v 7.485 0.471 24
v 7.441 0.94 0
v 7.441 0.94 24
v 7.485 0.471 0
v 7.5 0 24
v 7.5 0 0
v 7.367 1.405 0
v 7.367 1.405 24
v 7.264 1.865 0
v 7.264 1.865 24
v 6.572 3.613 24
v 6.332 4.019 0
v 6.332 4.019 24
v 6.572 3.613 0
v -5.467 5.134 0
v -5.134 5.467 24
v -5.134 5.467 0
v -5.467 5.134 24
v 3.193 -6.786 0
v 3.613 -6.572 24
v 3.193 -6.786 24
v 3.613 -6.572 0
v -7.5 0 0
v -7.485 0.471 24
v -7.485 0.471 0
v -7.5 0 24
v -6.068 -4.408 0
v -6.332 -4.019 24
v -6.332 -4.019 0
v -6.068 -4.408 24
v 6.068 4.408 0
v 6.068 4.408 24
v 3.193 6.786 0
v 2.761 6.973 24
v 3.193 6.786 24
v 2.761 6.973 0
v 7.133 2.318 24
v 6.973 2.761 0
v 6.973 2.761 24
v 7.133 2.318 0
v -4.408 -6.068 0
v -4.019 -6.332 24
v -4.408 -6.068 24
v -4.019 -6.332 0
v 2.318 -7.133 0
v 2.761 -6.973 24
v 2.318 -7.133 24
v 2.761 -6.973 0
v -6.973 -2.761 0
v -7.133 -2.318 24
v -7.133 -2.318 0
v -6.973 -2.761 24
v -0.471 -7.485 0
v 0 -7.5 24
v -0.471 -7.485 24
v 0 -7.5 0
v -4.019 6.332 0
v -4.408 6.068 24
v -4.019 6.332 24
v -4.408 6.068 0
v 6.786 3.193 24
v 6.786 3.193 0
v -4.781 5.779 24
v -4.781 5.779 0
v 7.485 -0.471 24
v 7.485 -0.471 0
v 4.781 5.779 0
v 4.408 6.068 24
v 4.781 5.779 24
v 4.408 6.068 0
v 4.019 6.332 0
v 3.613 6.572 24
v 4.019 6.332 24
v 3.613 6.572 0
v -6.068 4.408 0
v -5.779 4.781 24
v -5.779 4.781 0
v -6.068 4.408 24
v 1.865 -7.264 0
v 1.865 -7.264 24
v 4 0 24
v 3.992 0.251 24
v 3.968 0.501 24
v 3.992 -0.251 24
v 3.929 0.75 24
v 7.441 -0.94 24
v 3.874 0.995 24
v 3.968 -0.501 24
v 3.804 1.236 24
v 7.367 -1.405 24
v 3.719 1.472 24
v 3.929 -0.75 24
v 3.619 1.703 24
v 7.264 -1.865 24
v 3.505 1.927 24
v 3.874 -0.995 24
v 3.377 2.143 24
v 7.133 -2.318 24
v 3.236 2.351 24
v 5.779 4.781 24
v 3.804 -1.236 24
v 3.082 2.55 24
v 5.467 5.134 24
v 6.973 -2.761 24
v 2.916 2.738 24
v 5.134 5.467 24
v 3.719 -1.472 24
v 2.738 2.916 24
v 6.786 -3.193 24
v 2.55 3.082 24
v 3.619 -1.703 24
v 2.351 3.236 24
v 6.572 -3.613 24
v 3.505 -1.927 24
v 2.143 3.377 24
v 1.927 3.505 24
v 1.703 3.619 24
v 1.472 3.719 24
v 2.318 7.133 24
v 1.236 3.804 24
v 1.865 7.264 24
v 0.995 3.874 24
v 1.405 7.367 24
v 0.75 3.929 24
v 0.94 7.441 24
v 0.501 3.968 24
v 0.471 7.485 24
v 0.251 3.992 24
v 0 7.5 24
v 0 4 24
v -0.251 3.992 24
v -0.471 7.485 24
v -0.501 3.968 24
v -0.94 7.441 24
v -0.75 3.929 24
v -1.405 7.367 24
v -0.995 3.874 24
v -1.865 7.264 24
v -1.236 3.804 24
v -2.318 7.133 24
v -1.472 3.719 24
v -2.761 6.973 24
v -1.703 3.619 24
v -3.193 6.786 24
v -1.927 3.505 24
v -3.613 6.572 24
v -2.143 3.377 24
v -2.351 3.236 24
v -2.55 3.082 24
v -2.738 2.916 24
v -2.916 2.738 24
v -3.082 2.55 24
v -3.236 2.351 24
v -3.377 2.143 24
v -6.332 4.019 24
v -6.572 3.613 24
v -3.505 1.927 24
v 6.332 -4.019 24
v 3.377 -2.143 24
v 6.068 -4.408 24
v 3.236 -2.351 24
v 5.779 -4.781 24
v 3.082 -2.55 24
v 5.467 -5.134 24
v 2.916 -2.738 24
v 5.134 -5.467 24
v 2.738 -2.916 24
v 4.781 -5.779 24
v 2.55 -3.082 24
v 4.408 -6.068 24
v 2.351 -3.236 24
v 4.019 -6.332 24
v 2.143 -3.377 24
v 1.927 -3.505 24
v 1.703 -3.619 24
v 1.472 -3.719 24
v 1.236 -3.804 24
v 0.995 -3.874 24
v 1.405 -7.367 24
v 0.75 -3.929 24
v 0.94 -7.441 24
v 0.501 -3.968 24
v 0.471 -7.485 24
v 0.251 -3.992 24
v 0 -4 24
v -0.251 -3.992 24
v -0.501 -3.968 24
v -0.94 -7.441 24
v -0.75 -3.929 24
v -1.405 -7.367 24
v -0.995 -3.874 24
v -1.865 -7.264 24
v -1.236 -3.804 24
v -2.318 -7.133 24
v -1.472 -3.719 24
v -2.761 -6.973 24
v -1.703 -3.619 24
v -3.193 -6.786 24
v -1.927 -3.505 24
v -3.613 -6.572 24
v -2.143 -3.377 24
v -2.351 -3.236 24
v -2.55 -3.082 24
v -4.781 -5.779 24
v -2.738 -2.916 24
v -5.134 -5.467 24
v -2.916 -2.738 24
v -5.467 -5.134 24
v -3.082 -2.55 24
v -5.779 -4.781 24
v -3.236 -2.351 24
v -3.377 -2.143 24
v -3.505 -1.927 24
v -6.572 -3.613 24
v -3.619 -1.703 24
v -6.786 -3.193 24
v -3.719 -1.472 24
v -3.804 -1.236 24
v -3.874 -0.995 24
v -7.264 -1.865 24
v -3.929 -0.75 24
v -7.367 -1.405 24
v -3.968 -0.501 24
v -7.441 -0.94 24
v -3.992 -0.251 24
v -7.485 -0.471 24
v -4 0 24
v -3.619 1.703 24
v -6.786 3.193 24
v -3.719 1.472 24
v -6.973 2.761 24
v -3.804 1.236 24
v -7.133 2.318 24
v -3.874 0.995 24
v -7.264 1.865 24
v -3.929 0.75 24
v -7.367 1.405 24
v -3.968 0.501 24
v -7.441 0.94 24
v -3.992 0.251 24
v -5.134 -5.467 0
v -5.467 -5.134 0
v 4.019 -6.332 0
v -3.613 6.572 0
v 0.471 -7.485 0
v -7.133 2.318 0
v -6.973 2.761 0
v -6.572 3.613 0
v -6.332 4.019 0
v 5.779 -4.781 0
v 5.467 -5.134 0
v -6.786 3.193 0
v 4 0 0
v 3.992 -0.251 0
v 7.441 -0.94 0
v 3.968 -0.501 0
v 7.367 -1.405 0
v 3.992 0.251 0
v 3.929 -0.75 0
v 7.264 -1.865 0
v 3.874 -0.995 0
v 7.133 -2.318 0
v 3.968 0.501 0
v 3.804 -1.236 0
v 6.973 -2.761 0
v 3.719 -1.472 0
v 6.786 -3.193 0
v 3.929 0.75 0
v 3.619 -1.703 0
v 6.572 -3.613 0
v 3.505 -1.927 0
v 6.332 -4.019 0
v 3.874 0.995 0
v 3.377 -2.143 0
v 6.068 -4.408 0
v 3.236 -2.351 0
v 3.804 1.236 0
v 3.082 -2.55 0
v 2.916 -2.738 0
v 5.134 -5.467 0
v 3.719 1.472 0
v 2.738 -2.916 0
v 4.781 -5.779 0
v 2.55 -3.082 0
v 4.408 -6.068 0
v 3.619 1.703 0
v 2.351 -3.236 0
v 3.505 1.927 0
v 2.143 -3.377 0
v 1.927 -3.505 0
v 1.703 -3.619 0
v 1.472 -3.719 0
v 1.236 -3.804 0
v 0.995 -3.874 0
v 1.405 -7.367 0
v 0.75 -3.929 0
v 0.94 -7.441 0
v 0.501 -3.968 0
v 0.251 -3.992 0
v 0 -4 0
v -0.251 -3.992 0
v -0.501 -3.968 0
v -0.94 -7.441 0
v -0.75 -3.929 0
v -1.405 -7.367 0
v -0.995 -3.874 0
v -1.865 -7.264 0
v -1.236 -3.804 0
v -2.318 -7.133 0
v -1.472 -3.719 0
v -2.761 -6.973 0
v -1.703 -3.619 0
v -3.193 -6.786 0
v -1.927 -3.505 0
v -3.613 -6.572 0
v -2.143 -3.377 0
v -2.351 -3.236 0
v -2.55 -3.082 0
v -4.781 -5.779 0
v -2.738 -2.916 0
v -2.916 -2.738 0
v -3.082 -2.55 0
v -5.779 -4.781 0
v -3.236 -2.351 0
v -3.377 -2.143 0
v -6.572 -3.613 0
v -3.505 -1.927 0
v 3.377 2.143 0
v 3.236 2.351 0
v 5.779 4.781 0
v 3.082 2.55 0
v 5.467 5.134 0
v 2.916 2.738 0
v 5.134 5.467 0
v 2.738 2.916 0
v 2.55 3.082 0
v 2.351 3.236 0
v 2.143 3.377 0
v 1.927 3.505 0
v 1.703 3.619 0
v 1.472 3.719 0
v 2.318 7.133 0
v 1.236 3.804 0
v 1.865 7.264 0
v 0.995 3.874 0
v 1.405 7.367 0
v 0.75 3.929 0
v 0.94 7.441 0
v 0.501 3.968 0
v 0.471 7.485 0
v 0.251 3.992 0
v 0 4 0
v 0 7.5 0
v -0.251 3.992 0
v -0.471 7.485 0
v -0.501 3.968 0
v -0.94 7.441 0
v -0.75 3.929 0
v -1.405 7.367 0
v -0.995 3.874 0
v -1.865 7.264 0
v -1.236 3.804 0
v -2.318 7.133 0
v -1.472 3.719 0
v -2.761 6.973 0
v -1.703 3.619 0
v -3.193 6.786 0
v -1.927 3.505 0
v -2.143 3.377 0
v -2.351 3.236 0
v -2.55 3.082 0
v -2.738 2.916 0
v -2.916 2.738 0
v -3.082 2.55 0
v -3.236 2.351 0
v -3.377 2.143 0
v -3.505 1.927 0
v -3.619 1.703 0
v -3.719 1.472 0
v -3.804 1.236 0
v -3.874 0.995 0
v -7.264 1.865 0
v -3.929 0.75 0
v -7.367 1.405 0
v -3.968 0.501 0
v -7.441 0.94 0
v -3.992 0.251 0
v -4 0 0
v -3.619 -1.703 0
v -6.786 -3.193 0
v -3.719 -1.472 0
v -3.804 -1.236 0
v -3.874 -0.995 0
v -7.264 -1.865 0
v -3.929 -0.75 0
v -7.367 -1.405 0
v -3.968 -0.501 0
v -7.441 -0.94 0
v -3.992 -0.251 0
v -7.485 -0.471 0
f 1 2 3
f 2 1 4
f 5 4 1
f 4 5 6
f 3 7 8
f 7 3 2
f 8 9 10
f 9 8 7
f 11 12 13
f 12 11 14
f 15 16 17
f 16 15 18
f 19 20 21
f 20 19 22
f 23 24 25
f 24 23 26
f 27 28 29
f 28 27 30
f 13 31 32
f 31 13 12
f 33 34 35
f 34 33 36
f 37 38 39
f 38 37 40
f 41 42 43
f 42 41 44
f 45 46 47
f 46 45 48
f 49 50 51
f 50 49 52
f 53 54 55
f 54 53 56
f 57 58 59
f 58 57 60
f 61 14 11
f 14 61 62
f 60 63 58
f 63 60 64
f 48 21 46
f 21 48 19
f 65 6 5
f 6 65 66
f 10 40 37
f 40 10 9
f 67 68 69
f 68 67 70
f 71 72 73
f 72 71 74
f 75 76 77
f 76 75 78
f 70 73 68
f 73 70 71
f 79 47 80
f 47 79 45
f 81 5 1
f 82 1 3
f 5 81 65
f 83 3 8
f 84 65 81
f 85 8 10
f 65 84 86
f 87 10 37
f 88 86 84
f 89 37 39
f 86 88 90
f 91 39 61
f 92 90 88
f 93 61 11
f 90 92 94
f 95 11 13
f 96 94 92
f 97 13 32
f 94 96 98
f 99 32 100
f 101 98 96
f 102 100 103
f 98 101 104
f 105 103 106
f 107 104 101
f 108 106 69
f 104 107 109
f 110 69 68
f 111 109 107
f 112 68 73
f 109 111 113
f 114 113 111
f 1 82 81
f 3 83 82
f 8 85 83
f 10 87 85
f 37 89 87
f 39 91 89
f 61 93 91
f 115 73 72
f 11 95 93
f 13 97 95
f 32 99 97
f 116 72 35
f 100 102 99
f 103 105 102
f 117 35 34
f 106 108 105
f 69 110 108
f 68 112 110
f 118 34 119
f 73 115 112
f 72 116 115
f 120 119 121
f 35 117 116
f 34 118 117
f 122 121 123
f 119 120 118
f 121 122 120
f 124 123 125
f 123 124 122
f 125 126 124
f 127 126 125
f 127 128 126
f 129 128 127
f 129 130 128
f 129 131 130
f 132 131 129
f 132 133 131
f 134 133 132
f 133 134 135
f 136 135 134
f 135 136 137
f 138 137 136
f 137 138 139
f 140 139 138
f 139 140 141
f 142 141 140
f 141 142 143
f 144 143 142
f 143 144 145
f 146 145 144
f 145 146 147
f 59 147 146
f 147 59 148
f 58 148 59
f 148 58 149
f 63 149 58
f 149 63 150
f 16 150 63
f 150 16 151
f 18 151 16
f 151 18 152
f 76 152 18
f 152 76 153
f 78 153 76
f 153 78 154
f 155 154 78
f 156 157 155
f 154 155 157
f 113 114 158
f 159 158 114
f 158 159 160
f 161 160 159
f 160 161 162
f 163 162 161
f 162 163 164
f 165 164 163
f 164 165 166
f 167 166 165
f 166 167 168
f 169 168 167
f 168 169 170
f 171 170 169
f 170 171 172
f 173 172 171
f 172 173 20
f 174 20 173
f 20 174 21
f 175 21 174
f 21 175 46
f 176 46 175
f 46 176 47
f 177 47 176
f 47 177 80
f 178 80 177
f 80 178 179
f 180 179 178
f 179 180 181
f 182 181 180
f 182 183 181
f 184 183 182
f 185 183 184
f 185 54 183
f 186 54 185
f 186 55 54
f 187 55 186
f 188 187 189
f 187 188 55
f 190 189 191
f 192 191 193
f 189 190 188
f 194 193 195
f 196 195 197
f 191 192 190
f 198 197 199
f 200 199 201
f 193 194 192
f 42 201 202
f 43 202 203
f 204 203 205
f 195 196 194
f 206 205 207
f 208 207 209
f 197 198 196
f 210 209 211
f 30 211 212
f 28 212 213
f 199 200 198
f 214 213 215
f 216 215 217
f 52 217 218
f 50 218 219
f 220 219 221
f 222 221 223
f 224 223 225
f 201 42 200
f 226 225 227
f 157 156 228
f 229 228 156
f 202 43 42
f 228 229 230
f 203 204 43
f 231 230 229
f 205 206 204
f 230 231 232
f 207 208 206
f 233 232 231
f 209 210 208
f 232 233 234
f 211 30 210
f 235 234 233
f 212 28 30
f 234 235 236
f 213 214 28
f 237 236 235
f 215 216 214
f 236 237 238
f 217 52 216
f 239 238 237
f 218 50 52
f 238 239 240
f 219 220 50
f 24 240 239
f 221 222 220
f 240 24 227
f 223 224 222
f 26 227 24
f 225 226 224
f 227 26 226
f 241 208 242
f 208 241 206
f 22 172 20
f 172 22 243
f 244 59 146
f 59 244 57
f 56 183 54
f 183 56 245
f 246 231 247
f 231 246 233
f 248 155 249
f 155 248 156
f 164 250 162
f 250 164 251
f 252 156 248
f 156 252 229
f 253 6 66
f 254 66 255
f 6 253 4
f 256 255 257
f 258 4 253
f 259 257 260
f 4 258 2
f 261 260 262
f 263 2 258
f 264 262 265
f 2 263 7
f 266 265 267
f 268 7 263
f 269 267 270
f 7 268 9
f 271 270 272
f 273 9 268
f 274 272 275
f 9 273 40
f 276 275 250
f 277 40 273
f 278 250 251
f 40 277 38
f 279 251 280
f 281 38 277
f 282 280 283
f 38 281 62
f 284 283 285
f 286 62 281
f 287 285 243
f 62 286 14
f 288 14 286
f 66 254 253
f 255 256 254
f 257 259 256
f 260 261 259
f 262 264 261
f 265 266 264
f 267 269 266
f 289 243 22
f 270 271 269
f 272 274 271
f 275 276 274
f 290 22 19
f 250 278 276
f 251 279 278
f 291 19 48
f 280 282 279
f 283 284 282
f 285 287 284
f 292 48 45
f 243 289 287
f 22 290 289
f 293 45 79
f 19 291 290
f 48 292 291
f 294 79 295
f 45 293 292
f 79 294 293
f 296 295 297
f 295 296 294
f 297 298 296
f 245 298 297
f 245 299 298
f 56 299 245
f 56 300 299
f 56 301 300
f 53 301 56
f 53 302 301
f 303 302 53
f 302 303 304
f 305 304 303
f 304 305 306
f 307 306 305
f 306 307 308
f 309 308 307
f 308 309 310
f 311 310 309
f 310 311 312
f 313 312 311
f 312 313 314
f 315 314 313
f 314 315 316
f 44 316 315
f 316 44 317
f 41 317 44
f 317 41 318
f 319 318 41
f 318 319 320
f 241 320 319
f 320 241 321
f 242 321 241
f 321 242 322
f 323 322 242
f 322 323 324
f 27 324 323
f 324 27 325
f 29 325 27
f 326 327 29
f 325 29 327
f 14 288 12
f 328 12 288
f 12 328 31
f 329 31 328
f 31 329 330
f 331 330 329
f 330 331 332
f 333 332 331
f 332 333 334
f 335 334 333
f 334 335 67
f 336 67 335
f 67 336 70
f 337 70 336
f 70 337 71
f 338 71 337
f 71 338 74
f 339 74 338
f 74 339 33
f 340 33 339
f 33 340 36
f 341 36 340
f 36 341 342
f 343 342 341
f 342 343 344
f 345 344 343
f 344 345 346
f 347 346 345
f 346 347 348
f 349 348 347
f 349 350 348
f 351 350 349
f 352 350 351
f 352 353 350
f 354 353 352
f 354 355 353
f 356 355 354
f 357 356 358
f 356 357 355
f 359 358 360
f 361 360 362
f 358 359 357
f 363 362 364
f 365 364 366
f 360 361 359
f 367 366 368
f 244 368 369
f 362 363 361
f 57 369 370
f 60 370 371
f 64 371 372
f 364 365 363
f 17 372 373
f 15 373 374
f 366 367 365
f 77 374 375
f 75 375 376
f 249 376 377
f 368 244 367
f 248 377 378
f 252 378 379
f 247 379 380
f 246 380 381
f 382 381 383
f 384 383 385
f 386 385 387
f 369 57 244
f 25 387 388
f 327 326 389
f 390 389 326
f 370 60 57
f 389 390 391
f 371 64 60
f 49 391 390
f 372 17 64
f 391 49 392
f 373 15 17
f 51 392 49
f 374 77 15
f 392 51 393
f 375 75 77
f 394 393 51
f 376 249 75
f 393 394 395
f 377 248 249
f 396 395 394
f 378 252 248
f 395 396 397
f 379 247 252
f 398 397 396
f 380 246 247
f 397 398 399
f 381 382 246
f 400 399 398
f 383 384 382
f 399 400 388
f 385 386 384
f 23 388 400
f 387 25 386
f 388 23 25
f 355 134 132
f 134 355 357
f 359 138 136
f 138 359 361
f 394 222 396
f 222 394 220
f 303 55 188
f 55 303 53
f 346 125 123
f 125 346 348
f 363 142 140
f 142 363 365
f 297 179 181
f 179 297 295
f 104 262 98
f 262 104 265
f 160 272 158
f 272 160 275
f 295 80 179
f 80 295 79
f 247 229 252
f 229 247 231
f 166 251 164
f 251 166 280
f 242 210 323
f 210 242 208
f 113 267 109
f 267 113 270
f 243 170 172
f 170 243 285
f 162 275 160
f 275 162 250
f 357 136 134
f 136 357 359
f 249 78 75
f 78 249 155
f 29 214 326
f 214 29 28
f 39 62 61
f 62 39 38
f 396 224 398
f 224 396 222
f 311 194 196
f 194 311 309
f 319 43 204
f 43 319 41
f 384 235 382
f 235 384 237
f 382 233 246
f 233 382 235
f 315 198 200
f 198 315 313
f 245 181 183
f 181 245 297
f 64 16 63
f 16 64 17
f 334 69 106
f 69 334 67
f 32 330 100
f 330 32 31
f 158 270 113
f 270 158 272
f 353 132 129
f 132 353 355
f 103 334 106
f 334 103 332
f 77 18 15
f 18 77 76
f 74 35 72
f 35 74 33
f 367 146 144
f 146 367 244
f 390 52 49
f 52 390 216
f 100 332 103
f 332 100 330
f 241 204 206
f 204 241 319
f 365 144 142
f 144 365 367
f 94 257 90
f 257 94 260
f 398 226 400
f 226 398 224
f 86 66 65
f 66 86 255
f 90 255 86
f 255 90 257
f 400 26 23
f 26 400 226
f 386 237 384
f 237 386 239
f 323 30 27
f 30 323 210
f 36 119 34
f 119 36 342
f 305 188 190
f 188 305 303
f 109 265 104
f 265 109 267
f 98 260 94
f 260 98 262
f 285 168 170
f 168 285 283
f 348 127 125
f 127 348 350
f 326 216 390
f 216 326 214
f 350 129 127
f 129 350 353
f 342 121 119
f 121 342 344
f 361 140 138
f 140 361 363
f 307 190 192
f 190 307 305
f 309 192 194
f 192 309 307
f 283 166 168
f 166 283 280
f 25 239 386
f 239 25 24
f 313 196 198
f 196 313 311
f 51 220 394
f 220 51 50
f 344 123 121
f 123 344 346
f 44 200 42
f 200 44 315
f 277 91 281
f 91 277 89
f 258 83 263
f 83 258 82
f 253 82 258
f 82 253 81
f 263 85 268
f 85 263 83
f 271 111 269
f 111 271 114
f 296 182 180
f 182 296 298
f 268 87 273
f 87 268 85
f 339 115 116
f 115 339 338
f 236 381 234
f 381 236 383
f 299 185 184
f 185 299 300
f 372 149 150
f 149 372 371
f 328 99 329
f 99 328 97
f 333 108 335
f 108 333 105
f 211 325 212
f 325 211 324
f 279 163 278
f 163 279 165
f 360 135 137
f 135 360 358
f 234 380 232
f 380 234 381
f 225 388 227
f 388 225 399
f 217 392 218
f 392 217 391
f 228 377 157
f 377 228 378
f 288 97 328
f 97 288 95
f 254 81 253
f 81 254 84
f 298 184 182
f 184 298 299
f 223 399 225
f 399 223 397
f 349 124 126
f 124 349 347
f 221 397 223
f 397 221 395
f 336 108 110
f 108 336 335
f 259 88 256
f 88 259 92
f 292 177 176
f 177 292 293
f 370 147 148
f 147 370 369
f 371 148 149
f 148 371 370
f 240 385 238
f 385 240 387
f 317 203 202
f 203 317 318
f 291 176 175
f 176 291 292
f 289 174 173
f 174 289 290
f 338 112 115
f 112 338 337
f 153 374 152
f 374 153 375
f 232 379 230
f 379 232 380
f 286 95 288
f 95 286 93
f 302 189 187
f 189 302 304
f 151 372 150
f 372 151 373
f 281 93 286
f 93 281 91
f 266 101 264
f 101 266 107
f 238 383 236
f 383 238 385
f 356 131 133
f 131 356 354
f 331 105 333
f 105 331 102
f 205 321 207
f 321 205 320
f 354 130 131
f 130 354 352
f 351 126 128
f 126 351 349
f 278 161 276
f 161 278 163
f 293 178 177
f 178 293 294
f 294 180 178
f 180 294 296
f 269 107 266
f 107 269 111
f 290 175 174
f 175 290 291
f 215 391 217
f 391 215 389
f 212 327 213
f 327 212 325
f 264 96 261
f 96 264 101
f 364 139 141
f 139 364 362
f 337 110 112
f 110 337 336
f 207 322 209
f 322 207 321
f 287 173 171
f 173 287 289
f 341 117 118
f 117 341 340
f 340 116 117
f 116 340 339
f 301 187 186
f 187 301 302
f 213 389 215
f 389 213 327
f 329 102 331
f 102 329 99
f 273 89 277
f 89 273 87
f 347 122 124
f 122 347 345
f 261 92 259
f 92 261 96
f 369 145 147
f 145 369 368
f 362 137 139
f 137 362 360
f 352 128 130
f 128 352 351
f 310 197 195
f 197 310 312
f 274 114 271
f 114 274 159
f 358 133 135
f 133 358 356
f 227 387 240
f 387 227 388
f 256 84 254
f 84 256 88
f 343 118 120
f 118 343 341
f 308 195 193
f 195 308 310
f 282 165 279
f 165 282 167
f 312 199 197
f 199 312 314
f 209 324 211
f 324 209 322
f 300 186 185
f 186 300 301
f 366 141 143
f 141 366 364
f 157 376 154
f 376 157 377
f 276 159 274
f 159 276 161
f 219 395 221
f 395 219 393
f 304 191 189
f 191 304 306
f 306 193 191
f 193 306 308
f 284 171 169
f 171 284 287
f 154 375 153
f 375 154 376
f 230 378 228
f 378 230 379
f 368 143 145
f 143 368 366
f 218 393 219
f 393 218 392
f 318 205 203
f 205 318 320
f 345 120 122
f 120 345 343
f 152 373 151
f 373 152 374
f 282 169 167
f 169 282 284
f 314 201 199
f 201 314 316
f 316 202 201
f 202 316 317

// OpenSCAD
module linear_bearing_body() {
    difference() {
        cylinder(h = 24.0, d = 15.0, $fn = 100); // Outer casing
        translate([0, 0, -1]) // Extend inner bore slightly for clearance
            cylinder(h = 26.0, d = 8.0, $fn = 100); // Inner bore
    }
}

module inner_bore() {
    translate([0, 0, -1]) // Extend inner bore slightly for clearance
        cylinder(h = 26.0, d = 8.0, $fn = 100); // Inner bore
}

module outer_casing() {
    cylinder(h = 24.0, d = 15.0, $fn = 100); // Outer casing
}

module linear_bearing() {
    linear_bearing_body();
}

module screw_and_washer() {
    // Placeholder for screw and washer, not specified in detail
    translate([0, 0, 24])
        cylinder(h = 5, d = 4, $fn = 100); // Example screw
    translate([0, 0, 23])
        cylinder(h = 1, d = 8, $fn = 100); // Example washer
}

linear_bearing();
